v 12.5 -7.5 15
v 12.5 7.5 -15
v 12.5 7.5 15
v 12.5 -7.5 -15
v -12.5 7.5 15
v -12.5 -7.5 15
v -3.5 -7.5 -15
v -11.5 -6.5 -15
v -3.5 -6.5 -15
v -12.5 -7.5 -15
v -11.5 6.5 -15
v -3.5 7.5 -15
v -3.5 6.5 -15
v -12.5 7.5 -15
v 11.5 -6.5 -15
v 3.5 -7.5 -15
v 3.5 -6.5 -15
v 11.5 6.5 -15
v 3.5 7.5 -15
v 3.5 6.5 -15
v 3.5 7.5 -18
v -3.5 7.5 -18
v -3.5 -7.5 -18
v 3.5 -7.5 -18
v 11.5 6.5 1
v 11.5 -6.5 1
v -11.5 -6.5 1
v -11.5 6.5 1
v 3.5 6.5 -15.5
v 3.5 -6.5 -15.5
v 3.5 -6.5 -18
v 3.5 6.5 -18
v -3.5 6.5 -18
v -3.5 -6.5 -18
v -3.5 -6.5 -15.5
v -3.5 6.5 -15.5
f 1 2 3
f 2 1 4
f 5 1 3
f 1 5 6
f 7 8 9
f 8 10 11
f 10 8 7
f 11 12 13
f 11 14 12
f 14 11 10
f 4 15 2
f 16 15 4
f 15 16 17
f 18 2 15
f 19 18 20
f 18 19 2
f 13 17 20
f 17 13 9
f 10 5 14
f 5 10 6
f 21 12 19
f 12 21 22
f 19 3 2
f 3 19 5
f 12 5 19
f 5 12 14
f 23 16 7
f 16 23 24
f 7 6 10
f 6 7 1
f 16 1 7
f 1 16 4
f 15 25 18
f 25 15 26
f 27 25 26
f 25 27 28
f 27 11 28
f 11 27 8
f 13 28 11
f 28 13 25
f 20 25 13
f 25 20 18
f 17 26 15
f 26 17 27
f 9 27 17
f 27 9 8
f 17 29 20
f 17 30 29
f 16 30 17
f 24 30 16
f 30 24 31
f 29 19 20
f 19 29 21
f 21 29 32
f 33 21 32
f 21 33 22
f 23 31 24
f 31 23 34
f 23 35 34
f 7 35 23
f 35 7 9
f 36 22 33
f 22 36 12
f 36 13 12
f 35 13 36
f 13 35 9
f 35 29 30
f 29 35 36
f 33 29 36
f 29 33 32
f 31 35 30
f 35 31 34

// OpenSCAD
// Parameters
key_slot_width = 7; // Width of the key slot
key_slot_depth = 3; // Depth of the key slot
gripper_width = 25; // Width of the gripper
gripper_height = 30; // Height of the gripper
gripper_depth = 15; // Depth of the gripper

// Gripper
module gripper() {
    difference() {
        cube([gripper_width, gripper_depth, gripper_height], center = true);
        translate([0, 0, -gripper_height/2])
            cube([gripper_width - 2, gripper_depth - 2, gripper_height + 2], center = true);
    }
}

// Key slot
module key_slot() {
    difference() {
        cube([key_slot_width, gripper_depth, key_slot_depth], center = true);
        translate([0, 0, -key_slot_depth/2])
            cube([key_slot_width, gripper_depth - 2, key_slot_depth + 2], center = true);
    }
}

// Assembly
module key_gripper() {
    union() {
        gripper();
        translate([0, 0, -gripper_height/2 - key_slot_depth/2])
            key_slot();
    }
}

key_gripper();
